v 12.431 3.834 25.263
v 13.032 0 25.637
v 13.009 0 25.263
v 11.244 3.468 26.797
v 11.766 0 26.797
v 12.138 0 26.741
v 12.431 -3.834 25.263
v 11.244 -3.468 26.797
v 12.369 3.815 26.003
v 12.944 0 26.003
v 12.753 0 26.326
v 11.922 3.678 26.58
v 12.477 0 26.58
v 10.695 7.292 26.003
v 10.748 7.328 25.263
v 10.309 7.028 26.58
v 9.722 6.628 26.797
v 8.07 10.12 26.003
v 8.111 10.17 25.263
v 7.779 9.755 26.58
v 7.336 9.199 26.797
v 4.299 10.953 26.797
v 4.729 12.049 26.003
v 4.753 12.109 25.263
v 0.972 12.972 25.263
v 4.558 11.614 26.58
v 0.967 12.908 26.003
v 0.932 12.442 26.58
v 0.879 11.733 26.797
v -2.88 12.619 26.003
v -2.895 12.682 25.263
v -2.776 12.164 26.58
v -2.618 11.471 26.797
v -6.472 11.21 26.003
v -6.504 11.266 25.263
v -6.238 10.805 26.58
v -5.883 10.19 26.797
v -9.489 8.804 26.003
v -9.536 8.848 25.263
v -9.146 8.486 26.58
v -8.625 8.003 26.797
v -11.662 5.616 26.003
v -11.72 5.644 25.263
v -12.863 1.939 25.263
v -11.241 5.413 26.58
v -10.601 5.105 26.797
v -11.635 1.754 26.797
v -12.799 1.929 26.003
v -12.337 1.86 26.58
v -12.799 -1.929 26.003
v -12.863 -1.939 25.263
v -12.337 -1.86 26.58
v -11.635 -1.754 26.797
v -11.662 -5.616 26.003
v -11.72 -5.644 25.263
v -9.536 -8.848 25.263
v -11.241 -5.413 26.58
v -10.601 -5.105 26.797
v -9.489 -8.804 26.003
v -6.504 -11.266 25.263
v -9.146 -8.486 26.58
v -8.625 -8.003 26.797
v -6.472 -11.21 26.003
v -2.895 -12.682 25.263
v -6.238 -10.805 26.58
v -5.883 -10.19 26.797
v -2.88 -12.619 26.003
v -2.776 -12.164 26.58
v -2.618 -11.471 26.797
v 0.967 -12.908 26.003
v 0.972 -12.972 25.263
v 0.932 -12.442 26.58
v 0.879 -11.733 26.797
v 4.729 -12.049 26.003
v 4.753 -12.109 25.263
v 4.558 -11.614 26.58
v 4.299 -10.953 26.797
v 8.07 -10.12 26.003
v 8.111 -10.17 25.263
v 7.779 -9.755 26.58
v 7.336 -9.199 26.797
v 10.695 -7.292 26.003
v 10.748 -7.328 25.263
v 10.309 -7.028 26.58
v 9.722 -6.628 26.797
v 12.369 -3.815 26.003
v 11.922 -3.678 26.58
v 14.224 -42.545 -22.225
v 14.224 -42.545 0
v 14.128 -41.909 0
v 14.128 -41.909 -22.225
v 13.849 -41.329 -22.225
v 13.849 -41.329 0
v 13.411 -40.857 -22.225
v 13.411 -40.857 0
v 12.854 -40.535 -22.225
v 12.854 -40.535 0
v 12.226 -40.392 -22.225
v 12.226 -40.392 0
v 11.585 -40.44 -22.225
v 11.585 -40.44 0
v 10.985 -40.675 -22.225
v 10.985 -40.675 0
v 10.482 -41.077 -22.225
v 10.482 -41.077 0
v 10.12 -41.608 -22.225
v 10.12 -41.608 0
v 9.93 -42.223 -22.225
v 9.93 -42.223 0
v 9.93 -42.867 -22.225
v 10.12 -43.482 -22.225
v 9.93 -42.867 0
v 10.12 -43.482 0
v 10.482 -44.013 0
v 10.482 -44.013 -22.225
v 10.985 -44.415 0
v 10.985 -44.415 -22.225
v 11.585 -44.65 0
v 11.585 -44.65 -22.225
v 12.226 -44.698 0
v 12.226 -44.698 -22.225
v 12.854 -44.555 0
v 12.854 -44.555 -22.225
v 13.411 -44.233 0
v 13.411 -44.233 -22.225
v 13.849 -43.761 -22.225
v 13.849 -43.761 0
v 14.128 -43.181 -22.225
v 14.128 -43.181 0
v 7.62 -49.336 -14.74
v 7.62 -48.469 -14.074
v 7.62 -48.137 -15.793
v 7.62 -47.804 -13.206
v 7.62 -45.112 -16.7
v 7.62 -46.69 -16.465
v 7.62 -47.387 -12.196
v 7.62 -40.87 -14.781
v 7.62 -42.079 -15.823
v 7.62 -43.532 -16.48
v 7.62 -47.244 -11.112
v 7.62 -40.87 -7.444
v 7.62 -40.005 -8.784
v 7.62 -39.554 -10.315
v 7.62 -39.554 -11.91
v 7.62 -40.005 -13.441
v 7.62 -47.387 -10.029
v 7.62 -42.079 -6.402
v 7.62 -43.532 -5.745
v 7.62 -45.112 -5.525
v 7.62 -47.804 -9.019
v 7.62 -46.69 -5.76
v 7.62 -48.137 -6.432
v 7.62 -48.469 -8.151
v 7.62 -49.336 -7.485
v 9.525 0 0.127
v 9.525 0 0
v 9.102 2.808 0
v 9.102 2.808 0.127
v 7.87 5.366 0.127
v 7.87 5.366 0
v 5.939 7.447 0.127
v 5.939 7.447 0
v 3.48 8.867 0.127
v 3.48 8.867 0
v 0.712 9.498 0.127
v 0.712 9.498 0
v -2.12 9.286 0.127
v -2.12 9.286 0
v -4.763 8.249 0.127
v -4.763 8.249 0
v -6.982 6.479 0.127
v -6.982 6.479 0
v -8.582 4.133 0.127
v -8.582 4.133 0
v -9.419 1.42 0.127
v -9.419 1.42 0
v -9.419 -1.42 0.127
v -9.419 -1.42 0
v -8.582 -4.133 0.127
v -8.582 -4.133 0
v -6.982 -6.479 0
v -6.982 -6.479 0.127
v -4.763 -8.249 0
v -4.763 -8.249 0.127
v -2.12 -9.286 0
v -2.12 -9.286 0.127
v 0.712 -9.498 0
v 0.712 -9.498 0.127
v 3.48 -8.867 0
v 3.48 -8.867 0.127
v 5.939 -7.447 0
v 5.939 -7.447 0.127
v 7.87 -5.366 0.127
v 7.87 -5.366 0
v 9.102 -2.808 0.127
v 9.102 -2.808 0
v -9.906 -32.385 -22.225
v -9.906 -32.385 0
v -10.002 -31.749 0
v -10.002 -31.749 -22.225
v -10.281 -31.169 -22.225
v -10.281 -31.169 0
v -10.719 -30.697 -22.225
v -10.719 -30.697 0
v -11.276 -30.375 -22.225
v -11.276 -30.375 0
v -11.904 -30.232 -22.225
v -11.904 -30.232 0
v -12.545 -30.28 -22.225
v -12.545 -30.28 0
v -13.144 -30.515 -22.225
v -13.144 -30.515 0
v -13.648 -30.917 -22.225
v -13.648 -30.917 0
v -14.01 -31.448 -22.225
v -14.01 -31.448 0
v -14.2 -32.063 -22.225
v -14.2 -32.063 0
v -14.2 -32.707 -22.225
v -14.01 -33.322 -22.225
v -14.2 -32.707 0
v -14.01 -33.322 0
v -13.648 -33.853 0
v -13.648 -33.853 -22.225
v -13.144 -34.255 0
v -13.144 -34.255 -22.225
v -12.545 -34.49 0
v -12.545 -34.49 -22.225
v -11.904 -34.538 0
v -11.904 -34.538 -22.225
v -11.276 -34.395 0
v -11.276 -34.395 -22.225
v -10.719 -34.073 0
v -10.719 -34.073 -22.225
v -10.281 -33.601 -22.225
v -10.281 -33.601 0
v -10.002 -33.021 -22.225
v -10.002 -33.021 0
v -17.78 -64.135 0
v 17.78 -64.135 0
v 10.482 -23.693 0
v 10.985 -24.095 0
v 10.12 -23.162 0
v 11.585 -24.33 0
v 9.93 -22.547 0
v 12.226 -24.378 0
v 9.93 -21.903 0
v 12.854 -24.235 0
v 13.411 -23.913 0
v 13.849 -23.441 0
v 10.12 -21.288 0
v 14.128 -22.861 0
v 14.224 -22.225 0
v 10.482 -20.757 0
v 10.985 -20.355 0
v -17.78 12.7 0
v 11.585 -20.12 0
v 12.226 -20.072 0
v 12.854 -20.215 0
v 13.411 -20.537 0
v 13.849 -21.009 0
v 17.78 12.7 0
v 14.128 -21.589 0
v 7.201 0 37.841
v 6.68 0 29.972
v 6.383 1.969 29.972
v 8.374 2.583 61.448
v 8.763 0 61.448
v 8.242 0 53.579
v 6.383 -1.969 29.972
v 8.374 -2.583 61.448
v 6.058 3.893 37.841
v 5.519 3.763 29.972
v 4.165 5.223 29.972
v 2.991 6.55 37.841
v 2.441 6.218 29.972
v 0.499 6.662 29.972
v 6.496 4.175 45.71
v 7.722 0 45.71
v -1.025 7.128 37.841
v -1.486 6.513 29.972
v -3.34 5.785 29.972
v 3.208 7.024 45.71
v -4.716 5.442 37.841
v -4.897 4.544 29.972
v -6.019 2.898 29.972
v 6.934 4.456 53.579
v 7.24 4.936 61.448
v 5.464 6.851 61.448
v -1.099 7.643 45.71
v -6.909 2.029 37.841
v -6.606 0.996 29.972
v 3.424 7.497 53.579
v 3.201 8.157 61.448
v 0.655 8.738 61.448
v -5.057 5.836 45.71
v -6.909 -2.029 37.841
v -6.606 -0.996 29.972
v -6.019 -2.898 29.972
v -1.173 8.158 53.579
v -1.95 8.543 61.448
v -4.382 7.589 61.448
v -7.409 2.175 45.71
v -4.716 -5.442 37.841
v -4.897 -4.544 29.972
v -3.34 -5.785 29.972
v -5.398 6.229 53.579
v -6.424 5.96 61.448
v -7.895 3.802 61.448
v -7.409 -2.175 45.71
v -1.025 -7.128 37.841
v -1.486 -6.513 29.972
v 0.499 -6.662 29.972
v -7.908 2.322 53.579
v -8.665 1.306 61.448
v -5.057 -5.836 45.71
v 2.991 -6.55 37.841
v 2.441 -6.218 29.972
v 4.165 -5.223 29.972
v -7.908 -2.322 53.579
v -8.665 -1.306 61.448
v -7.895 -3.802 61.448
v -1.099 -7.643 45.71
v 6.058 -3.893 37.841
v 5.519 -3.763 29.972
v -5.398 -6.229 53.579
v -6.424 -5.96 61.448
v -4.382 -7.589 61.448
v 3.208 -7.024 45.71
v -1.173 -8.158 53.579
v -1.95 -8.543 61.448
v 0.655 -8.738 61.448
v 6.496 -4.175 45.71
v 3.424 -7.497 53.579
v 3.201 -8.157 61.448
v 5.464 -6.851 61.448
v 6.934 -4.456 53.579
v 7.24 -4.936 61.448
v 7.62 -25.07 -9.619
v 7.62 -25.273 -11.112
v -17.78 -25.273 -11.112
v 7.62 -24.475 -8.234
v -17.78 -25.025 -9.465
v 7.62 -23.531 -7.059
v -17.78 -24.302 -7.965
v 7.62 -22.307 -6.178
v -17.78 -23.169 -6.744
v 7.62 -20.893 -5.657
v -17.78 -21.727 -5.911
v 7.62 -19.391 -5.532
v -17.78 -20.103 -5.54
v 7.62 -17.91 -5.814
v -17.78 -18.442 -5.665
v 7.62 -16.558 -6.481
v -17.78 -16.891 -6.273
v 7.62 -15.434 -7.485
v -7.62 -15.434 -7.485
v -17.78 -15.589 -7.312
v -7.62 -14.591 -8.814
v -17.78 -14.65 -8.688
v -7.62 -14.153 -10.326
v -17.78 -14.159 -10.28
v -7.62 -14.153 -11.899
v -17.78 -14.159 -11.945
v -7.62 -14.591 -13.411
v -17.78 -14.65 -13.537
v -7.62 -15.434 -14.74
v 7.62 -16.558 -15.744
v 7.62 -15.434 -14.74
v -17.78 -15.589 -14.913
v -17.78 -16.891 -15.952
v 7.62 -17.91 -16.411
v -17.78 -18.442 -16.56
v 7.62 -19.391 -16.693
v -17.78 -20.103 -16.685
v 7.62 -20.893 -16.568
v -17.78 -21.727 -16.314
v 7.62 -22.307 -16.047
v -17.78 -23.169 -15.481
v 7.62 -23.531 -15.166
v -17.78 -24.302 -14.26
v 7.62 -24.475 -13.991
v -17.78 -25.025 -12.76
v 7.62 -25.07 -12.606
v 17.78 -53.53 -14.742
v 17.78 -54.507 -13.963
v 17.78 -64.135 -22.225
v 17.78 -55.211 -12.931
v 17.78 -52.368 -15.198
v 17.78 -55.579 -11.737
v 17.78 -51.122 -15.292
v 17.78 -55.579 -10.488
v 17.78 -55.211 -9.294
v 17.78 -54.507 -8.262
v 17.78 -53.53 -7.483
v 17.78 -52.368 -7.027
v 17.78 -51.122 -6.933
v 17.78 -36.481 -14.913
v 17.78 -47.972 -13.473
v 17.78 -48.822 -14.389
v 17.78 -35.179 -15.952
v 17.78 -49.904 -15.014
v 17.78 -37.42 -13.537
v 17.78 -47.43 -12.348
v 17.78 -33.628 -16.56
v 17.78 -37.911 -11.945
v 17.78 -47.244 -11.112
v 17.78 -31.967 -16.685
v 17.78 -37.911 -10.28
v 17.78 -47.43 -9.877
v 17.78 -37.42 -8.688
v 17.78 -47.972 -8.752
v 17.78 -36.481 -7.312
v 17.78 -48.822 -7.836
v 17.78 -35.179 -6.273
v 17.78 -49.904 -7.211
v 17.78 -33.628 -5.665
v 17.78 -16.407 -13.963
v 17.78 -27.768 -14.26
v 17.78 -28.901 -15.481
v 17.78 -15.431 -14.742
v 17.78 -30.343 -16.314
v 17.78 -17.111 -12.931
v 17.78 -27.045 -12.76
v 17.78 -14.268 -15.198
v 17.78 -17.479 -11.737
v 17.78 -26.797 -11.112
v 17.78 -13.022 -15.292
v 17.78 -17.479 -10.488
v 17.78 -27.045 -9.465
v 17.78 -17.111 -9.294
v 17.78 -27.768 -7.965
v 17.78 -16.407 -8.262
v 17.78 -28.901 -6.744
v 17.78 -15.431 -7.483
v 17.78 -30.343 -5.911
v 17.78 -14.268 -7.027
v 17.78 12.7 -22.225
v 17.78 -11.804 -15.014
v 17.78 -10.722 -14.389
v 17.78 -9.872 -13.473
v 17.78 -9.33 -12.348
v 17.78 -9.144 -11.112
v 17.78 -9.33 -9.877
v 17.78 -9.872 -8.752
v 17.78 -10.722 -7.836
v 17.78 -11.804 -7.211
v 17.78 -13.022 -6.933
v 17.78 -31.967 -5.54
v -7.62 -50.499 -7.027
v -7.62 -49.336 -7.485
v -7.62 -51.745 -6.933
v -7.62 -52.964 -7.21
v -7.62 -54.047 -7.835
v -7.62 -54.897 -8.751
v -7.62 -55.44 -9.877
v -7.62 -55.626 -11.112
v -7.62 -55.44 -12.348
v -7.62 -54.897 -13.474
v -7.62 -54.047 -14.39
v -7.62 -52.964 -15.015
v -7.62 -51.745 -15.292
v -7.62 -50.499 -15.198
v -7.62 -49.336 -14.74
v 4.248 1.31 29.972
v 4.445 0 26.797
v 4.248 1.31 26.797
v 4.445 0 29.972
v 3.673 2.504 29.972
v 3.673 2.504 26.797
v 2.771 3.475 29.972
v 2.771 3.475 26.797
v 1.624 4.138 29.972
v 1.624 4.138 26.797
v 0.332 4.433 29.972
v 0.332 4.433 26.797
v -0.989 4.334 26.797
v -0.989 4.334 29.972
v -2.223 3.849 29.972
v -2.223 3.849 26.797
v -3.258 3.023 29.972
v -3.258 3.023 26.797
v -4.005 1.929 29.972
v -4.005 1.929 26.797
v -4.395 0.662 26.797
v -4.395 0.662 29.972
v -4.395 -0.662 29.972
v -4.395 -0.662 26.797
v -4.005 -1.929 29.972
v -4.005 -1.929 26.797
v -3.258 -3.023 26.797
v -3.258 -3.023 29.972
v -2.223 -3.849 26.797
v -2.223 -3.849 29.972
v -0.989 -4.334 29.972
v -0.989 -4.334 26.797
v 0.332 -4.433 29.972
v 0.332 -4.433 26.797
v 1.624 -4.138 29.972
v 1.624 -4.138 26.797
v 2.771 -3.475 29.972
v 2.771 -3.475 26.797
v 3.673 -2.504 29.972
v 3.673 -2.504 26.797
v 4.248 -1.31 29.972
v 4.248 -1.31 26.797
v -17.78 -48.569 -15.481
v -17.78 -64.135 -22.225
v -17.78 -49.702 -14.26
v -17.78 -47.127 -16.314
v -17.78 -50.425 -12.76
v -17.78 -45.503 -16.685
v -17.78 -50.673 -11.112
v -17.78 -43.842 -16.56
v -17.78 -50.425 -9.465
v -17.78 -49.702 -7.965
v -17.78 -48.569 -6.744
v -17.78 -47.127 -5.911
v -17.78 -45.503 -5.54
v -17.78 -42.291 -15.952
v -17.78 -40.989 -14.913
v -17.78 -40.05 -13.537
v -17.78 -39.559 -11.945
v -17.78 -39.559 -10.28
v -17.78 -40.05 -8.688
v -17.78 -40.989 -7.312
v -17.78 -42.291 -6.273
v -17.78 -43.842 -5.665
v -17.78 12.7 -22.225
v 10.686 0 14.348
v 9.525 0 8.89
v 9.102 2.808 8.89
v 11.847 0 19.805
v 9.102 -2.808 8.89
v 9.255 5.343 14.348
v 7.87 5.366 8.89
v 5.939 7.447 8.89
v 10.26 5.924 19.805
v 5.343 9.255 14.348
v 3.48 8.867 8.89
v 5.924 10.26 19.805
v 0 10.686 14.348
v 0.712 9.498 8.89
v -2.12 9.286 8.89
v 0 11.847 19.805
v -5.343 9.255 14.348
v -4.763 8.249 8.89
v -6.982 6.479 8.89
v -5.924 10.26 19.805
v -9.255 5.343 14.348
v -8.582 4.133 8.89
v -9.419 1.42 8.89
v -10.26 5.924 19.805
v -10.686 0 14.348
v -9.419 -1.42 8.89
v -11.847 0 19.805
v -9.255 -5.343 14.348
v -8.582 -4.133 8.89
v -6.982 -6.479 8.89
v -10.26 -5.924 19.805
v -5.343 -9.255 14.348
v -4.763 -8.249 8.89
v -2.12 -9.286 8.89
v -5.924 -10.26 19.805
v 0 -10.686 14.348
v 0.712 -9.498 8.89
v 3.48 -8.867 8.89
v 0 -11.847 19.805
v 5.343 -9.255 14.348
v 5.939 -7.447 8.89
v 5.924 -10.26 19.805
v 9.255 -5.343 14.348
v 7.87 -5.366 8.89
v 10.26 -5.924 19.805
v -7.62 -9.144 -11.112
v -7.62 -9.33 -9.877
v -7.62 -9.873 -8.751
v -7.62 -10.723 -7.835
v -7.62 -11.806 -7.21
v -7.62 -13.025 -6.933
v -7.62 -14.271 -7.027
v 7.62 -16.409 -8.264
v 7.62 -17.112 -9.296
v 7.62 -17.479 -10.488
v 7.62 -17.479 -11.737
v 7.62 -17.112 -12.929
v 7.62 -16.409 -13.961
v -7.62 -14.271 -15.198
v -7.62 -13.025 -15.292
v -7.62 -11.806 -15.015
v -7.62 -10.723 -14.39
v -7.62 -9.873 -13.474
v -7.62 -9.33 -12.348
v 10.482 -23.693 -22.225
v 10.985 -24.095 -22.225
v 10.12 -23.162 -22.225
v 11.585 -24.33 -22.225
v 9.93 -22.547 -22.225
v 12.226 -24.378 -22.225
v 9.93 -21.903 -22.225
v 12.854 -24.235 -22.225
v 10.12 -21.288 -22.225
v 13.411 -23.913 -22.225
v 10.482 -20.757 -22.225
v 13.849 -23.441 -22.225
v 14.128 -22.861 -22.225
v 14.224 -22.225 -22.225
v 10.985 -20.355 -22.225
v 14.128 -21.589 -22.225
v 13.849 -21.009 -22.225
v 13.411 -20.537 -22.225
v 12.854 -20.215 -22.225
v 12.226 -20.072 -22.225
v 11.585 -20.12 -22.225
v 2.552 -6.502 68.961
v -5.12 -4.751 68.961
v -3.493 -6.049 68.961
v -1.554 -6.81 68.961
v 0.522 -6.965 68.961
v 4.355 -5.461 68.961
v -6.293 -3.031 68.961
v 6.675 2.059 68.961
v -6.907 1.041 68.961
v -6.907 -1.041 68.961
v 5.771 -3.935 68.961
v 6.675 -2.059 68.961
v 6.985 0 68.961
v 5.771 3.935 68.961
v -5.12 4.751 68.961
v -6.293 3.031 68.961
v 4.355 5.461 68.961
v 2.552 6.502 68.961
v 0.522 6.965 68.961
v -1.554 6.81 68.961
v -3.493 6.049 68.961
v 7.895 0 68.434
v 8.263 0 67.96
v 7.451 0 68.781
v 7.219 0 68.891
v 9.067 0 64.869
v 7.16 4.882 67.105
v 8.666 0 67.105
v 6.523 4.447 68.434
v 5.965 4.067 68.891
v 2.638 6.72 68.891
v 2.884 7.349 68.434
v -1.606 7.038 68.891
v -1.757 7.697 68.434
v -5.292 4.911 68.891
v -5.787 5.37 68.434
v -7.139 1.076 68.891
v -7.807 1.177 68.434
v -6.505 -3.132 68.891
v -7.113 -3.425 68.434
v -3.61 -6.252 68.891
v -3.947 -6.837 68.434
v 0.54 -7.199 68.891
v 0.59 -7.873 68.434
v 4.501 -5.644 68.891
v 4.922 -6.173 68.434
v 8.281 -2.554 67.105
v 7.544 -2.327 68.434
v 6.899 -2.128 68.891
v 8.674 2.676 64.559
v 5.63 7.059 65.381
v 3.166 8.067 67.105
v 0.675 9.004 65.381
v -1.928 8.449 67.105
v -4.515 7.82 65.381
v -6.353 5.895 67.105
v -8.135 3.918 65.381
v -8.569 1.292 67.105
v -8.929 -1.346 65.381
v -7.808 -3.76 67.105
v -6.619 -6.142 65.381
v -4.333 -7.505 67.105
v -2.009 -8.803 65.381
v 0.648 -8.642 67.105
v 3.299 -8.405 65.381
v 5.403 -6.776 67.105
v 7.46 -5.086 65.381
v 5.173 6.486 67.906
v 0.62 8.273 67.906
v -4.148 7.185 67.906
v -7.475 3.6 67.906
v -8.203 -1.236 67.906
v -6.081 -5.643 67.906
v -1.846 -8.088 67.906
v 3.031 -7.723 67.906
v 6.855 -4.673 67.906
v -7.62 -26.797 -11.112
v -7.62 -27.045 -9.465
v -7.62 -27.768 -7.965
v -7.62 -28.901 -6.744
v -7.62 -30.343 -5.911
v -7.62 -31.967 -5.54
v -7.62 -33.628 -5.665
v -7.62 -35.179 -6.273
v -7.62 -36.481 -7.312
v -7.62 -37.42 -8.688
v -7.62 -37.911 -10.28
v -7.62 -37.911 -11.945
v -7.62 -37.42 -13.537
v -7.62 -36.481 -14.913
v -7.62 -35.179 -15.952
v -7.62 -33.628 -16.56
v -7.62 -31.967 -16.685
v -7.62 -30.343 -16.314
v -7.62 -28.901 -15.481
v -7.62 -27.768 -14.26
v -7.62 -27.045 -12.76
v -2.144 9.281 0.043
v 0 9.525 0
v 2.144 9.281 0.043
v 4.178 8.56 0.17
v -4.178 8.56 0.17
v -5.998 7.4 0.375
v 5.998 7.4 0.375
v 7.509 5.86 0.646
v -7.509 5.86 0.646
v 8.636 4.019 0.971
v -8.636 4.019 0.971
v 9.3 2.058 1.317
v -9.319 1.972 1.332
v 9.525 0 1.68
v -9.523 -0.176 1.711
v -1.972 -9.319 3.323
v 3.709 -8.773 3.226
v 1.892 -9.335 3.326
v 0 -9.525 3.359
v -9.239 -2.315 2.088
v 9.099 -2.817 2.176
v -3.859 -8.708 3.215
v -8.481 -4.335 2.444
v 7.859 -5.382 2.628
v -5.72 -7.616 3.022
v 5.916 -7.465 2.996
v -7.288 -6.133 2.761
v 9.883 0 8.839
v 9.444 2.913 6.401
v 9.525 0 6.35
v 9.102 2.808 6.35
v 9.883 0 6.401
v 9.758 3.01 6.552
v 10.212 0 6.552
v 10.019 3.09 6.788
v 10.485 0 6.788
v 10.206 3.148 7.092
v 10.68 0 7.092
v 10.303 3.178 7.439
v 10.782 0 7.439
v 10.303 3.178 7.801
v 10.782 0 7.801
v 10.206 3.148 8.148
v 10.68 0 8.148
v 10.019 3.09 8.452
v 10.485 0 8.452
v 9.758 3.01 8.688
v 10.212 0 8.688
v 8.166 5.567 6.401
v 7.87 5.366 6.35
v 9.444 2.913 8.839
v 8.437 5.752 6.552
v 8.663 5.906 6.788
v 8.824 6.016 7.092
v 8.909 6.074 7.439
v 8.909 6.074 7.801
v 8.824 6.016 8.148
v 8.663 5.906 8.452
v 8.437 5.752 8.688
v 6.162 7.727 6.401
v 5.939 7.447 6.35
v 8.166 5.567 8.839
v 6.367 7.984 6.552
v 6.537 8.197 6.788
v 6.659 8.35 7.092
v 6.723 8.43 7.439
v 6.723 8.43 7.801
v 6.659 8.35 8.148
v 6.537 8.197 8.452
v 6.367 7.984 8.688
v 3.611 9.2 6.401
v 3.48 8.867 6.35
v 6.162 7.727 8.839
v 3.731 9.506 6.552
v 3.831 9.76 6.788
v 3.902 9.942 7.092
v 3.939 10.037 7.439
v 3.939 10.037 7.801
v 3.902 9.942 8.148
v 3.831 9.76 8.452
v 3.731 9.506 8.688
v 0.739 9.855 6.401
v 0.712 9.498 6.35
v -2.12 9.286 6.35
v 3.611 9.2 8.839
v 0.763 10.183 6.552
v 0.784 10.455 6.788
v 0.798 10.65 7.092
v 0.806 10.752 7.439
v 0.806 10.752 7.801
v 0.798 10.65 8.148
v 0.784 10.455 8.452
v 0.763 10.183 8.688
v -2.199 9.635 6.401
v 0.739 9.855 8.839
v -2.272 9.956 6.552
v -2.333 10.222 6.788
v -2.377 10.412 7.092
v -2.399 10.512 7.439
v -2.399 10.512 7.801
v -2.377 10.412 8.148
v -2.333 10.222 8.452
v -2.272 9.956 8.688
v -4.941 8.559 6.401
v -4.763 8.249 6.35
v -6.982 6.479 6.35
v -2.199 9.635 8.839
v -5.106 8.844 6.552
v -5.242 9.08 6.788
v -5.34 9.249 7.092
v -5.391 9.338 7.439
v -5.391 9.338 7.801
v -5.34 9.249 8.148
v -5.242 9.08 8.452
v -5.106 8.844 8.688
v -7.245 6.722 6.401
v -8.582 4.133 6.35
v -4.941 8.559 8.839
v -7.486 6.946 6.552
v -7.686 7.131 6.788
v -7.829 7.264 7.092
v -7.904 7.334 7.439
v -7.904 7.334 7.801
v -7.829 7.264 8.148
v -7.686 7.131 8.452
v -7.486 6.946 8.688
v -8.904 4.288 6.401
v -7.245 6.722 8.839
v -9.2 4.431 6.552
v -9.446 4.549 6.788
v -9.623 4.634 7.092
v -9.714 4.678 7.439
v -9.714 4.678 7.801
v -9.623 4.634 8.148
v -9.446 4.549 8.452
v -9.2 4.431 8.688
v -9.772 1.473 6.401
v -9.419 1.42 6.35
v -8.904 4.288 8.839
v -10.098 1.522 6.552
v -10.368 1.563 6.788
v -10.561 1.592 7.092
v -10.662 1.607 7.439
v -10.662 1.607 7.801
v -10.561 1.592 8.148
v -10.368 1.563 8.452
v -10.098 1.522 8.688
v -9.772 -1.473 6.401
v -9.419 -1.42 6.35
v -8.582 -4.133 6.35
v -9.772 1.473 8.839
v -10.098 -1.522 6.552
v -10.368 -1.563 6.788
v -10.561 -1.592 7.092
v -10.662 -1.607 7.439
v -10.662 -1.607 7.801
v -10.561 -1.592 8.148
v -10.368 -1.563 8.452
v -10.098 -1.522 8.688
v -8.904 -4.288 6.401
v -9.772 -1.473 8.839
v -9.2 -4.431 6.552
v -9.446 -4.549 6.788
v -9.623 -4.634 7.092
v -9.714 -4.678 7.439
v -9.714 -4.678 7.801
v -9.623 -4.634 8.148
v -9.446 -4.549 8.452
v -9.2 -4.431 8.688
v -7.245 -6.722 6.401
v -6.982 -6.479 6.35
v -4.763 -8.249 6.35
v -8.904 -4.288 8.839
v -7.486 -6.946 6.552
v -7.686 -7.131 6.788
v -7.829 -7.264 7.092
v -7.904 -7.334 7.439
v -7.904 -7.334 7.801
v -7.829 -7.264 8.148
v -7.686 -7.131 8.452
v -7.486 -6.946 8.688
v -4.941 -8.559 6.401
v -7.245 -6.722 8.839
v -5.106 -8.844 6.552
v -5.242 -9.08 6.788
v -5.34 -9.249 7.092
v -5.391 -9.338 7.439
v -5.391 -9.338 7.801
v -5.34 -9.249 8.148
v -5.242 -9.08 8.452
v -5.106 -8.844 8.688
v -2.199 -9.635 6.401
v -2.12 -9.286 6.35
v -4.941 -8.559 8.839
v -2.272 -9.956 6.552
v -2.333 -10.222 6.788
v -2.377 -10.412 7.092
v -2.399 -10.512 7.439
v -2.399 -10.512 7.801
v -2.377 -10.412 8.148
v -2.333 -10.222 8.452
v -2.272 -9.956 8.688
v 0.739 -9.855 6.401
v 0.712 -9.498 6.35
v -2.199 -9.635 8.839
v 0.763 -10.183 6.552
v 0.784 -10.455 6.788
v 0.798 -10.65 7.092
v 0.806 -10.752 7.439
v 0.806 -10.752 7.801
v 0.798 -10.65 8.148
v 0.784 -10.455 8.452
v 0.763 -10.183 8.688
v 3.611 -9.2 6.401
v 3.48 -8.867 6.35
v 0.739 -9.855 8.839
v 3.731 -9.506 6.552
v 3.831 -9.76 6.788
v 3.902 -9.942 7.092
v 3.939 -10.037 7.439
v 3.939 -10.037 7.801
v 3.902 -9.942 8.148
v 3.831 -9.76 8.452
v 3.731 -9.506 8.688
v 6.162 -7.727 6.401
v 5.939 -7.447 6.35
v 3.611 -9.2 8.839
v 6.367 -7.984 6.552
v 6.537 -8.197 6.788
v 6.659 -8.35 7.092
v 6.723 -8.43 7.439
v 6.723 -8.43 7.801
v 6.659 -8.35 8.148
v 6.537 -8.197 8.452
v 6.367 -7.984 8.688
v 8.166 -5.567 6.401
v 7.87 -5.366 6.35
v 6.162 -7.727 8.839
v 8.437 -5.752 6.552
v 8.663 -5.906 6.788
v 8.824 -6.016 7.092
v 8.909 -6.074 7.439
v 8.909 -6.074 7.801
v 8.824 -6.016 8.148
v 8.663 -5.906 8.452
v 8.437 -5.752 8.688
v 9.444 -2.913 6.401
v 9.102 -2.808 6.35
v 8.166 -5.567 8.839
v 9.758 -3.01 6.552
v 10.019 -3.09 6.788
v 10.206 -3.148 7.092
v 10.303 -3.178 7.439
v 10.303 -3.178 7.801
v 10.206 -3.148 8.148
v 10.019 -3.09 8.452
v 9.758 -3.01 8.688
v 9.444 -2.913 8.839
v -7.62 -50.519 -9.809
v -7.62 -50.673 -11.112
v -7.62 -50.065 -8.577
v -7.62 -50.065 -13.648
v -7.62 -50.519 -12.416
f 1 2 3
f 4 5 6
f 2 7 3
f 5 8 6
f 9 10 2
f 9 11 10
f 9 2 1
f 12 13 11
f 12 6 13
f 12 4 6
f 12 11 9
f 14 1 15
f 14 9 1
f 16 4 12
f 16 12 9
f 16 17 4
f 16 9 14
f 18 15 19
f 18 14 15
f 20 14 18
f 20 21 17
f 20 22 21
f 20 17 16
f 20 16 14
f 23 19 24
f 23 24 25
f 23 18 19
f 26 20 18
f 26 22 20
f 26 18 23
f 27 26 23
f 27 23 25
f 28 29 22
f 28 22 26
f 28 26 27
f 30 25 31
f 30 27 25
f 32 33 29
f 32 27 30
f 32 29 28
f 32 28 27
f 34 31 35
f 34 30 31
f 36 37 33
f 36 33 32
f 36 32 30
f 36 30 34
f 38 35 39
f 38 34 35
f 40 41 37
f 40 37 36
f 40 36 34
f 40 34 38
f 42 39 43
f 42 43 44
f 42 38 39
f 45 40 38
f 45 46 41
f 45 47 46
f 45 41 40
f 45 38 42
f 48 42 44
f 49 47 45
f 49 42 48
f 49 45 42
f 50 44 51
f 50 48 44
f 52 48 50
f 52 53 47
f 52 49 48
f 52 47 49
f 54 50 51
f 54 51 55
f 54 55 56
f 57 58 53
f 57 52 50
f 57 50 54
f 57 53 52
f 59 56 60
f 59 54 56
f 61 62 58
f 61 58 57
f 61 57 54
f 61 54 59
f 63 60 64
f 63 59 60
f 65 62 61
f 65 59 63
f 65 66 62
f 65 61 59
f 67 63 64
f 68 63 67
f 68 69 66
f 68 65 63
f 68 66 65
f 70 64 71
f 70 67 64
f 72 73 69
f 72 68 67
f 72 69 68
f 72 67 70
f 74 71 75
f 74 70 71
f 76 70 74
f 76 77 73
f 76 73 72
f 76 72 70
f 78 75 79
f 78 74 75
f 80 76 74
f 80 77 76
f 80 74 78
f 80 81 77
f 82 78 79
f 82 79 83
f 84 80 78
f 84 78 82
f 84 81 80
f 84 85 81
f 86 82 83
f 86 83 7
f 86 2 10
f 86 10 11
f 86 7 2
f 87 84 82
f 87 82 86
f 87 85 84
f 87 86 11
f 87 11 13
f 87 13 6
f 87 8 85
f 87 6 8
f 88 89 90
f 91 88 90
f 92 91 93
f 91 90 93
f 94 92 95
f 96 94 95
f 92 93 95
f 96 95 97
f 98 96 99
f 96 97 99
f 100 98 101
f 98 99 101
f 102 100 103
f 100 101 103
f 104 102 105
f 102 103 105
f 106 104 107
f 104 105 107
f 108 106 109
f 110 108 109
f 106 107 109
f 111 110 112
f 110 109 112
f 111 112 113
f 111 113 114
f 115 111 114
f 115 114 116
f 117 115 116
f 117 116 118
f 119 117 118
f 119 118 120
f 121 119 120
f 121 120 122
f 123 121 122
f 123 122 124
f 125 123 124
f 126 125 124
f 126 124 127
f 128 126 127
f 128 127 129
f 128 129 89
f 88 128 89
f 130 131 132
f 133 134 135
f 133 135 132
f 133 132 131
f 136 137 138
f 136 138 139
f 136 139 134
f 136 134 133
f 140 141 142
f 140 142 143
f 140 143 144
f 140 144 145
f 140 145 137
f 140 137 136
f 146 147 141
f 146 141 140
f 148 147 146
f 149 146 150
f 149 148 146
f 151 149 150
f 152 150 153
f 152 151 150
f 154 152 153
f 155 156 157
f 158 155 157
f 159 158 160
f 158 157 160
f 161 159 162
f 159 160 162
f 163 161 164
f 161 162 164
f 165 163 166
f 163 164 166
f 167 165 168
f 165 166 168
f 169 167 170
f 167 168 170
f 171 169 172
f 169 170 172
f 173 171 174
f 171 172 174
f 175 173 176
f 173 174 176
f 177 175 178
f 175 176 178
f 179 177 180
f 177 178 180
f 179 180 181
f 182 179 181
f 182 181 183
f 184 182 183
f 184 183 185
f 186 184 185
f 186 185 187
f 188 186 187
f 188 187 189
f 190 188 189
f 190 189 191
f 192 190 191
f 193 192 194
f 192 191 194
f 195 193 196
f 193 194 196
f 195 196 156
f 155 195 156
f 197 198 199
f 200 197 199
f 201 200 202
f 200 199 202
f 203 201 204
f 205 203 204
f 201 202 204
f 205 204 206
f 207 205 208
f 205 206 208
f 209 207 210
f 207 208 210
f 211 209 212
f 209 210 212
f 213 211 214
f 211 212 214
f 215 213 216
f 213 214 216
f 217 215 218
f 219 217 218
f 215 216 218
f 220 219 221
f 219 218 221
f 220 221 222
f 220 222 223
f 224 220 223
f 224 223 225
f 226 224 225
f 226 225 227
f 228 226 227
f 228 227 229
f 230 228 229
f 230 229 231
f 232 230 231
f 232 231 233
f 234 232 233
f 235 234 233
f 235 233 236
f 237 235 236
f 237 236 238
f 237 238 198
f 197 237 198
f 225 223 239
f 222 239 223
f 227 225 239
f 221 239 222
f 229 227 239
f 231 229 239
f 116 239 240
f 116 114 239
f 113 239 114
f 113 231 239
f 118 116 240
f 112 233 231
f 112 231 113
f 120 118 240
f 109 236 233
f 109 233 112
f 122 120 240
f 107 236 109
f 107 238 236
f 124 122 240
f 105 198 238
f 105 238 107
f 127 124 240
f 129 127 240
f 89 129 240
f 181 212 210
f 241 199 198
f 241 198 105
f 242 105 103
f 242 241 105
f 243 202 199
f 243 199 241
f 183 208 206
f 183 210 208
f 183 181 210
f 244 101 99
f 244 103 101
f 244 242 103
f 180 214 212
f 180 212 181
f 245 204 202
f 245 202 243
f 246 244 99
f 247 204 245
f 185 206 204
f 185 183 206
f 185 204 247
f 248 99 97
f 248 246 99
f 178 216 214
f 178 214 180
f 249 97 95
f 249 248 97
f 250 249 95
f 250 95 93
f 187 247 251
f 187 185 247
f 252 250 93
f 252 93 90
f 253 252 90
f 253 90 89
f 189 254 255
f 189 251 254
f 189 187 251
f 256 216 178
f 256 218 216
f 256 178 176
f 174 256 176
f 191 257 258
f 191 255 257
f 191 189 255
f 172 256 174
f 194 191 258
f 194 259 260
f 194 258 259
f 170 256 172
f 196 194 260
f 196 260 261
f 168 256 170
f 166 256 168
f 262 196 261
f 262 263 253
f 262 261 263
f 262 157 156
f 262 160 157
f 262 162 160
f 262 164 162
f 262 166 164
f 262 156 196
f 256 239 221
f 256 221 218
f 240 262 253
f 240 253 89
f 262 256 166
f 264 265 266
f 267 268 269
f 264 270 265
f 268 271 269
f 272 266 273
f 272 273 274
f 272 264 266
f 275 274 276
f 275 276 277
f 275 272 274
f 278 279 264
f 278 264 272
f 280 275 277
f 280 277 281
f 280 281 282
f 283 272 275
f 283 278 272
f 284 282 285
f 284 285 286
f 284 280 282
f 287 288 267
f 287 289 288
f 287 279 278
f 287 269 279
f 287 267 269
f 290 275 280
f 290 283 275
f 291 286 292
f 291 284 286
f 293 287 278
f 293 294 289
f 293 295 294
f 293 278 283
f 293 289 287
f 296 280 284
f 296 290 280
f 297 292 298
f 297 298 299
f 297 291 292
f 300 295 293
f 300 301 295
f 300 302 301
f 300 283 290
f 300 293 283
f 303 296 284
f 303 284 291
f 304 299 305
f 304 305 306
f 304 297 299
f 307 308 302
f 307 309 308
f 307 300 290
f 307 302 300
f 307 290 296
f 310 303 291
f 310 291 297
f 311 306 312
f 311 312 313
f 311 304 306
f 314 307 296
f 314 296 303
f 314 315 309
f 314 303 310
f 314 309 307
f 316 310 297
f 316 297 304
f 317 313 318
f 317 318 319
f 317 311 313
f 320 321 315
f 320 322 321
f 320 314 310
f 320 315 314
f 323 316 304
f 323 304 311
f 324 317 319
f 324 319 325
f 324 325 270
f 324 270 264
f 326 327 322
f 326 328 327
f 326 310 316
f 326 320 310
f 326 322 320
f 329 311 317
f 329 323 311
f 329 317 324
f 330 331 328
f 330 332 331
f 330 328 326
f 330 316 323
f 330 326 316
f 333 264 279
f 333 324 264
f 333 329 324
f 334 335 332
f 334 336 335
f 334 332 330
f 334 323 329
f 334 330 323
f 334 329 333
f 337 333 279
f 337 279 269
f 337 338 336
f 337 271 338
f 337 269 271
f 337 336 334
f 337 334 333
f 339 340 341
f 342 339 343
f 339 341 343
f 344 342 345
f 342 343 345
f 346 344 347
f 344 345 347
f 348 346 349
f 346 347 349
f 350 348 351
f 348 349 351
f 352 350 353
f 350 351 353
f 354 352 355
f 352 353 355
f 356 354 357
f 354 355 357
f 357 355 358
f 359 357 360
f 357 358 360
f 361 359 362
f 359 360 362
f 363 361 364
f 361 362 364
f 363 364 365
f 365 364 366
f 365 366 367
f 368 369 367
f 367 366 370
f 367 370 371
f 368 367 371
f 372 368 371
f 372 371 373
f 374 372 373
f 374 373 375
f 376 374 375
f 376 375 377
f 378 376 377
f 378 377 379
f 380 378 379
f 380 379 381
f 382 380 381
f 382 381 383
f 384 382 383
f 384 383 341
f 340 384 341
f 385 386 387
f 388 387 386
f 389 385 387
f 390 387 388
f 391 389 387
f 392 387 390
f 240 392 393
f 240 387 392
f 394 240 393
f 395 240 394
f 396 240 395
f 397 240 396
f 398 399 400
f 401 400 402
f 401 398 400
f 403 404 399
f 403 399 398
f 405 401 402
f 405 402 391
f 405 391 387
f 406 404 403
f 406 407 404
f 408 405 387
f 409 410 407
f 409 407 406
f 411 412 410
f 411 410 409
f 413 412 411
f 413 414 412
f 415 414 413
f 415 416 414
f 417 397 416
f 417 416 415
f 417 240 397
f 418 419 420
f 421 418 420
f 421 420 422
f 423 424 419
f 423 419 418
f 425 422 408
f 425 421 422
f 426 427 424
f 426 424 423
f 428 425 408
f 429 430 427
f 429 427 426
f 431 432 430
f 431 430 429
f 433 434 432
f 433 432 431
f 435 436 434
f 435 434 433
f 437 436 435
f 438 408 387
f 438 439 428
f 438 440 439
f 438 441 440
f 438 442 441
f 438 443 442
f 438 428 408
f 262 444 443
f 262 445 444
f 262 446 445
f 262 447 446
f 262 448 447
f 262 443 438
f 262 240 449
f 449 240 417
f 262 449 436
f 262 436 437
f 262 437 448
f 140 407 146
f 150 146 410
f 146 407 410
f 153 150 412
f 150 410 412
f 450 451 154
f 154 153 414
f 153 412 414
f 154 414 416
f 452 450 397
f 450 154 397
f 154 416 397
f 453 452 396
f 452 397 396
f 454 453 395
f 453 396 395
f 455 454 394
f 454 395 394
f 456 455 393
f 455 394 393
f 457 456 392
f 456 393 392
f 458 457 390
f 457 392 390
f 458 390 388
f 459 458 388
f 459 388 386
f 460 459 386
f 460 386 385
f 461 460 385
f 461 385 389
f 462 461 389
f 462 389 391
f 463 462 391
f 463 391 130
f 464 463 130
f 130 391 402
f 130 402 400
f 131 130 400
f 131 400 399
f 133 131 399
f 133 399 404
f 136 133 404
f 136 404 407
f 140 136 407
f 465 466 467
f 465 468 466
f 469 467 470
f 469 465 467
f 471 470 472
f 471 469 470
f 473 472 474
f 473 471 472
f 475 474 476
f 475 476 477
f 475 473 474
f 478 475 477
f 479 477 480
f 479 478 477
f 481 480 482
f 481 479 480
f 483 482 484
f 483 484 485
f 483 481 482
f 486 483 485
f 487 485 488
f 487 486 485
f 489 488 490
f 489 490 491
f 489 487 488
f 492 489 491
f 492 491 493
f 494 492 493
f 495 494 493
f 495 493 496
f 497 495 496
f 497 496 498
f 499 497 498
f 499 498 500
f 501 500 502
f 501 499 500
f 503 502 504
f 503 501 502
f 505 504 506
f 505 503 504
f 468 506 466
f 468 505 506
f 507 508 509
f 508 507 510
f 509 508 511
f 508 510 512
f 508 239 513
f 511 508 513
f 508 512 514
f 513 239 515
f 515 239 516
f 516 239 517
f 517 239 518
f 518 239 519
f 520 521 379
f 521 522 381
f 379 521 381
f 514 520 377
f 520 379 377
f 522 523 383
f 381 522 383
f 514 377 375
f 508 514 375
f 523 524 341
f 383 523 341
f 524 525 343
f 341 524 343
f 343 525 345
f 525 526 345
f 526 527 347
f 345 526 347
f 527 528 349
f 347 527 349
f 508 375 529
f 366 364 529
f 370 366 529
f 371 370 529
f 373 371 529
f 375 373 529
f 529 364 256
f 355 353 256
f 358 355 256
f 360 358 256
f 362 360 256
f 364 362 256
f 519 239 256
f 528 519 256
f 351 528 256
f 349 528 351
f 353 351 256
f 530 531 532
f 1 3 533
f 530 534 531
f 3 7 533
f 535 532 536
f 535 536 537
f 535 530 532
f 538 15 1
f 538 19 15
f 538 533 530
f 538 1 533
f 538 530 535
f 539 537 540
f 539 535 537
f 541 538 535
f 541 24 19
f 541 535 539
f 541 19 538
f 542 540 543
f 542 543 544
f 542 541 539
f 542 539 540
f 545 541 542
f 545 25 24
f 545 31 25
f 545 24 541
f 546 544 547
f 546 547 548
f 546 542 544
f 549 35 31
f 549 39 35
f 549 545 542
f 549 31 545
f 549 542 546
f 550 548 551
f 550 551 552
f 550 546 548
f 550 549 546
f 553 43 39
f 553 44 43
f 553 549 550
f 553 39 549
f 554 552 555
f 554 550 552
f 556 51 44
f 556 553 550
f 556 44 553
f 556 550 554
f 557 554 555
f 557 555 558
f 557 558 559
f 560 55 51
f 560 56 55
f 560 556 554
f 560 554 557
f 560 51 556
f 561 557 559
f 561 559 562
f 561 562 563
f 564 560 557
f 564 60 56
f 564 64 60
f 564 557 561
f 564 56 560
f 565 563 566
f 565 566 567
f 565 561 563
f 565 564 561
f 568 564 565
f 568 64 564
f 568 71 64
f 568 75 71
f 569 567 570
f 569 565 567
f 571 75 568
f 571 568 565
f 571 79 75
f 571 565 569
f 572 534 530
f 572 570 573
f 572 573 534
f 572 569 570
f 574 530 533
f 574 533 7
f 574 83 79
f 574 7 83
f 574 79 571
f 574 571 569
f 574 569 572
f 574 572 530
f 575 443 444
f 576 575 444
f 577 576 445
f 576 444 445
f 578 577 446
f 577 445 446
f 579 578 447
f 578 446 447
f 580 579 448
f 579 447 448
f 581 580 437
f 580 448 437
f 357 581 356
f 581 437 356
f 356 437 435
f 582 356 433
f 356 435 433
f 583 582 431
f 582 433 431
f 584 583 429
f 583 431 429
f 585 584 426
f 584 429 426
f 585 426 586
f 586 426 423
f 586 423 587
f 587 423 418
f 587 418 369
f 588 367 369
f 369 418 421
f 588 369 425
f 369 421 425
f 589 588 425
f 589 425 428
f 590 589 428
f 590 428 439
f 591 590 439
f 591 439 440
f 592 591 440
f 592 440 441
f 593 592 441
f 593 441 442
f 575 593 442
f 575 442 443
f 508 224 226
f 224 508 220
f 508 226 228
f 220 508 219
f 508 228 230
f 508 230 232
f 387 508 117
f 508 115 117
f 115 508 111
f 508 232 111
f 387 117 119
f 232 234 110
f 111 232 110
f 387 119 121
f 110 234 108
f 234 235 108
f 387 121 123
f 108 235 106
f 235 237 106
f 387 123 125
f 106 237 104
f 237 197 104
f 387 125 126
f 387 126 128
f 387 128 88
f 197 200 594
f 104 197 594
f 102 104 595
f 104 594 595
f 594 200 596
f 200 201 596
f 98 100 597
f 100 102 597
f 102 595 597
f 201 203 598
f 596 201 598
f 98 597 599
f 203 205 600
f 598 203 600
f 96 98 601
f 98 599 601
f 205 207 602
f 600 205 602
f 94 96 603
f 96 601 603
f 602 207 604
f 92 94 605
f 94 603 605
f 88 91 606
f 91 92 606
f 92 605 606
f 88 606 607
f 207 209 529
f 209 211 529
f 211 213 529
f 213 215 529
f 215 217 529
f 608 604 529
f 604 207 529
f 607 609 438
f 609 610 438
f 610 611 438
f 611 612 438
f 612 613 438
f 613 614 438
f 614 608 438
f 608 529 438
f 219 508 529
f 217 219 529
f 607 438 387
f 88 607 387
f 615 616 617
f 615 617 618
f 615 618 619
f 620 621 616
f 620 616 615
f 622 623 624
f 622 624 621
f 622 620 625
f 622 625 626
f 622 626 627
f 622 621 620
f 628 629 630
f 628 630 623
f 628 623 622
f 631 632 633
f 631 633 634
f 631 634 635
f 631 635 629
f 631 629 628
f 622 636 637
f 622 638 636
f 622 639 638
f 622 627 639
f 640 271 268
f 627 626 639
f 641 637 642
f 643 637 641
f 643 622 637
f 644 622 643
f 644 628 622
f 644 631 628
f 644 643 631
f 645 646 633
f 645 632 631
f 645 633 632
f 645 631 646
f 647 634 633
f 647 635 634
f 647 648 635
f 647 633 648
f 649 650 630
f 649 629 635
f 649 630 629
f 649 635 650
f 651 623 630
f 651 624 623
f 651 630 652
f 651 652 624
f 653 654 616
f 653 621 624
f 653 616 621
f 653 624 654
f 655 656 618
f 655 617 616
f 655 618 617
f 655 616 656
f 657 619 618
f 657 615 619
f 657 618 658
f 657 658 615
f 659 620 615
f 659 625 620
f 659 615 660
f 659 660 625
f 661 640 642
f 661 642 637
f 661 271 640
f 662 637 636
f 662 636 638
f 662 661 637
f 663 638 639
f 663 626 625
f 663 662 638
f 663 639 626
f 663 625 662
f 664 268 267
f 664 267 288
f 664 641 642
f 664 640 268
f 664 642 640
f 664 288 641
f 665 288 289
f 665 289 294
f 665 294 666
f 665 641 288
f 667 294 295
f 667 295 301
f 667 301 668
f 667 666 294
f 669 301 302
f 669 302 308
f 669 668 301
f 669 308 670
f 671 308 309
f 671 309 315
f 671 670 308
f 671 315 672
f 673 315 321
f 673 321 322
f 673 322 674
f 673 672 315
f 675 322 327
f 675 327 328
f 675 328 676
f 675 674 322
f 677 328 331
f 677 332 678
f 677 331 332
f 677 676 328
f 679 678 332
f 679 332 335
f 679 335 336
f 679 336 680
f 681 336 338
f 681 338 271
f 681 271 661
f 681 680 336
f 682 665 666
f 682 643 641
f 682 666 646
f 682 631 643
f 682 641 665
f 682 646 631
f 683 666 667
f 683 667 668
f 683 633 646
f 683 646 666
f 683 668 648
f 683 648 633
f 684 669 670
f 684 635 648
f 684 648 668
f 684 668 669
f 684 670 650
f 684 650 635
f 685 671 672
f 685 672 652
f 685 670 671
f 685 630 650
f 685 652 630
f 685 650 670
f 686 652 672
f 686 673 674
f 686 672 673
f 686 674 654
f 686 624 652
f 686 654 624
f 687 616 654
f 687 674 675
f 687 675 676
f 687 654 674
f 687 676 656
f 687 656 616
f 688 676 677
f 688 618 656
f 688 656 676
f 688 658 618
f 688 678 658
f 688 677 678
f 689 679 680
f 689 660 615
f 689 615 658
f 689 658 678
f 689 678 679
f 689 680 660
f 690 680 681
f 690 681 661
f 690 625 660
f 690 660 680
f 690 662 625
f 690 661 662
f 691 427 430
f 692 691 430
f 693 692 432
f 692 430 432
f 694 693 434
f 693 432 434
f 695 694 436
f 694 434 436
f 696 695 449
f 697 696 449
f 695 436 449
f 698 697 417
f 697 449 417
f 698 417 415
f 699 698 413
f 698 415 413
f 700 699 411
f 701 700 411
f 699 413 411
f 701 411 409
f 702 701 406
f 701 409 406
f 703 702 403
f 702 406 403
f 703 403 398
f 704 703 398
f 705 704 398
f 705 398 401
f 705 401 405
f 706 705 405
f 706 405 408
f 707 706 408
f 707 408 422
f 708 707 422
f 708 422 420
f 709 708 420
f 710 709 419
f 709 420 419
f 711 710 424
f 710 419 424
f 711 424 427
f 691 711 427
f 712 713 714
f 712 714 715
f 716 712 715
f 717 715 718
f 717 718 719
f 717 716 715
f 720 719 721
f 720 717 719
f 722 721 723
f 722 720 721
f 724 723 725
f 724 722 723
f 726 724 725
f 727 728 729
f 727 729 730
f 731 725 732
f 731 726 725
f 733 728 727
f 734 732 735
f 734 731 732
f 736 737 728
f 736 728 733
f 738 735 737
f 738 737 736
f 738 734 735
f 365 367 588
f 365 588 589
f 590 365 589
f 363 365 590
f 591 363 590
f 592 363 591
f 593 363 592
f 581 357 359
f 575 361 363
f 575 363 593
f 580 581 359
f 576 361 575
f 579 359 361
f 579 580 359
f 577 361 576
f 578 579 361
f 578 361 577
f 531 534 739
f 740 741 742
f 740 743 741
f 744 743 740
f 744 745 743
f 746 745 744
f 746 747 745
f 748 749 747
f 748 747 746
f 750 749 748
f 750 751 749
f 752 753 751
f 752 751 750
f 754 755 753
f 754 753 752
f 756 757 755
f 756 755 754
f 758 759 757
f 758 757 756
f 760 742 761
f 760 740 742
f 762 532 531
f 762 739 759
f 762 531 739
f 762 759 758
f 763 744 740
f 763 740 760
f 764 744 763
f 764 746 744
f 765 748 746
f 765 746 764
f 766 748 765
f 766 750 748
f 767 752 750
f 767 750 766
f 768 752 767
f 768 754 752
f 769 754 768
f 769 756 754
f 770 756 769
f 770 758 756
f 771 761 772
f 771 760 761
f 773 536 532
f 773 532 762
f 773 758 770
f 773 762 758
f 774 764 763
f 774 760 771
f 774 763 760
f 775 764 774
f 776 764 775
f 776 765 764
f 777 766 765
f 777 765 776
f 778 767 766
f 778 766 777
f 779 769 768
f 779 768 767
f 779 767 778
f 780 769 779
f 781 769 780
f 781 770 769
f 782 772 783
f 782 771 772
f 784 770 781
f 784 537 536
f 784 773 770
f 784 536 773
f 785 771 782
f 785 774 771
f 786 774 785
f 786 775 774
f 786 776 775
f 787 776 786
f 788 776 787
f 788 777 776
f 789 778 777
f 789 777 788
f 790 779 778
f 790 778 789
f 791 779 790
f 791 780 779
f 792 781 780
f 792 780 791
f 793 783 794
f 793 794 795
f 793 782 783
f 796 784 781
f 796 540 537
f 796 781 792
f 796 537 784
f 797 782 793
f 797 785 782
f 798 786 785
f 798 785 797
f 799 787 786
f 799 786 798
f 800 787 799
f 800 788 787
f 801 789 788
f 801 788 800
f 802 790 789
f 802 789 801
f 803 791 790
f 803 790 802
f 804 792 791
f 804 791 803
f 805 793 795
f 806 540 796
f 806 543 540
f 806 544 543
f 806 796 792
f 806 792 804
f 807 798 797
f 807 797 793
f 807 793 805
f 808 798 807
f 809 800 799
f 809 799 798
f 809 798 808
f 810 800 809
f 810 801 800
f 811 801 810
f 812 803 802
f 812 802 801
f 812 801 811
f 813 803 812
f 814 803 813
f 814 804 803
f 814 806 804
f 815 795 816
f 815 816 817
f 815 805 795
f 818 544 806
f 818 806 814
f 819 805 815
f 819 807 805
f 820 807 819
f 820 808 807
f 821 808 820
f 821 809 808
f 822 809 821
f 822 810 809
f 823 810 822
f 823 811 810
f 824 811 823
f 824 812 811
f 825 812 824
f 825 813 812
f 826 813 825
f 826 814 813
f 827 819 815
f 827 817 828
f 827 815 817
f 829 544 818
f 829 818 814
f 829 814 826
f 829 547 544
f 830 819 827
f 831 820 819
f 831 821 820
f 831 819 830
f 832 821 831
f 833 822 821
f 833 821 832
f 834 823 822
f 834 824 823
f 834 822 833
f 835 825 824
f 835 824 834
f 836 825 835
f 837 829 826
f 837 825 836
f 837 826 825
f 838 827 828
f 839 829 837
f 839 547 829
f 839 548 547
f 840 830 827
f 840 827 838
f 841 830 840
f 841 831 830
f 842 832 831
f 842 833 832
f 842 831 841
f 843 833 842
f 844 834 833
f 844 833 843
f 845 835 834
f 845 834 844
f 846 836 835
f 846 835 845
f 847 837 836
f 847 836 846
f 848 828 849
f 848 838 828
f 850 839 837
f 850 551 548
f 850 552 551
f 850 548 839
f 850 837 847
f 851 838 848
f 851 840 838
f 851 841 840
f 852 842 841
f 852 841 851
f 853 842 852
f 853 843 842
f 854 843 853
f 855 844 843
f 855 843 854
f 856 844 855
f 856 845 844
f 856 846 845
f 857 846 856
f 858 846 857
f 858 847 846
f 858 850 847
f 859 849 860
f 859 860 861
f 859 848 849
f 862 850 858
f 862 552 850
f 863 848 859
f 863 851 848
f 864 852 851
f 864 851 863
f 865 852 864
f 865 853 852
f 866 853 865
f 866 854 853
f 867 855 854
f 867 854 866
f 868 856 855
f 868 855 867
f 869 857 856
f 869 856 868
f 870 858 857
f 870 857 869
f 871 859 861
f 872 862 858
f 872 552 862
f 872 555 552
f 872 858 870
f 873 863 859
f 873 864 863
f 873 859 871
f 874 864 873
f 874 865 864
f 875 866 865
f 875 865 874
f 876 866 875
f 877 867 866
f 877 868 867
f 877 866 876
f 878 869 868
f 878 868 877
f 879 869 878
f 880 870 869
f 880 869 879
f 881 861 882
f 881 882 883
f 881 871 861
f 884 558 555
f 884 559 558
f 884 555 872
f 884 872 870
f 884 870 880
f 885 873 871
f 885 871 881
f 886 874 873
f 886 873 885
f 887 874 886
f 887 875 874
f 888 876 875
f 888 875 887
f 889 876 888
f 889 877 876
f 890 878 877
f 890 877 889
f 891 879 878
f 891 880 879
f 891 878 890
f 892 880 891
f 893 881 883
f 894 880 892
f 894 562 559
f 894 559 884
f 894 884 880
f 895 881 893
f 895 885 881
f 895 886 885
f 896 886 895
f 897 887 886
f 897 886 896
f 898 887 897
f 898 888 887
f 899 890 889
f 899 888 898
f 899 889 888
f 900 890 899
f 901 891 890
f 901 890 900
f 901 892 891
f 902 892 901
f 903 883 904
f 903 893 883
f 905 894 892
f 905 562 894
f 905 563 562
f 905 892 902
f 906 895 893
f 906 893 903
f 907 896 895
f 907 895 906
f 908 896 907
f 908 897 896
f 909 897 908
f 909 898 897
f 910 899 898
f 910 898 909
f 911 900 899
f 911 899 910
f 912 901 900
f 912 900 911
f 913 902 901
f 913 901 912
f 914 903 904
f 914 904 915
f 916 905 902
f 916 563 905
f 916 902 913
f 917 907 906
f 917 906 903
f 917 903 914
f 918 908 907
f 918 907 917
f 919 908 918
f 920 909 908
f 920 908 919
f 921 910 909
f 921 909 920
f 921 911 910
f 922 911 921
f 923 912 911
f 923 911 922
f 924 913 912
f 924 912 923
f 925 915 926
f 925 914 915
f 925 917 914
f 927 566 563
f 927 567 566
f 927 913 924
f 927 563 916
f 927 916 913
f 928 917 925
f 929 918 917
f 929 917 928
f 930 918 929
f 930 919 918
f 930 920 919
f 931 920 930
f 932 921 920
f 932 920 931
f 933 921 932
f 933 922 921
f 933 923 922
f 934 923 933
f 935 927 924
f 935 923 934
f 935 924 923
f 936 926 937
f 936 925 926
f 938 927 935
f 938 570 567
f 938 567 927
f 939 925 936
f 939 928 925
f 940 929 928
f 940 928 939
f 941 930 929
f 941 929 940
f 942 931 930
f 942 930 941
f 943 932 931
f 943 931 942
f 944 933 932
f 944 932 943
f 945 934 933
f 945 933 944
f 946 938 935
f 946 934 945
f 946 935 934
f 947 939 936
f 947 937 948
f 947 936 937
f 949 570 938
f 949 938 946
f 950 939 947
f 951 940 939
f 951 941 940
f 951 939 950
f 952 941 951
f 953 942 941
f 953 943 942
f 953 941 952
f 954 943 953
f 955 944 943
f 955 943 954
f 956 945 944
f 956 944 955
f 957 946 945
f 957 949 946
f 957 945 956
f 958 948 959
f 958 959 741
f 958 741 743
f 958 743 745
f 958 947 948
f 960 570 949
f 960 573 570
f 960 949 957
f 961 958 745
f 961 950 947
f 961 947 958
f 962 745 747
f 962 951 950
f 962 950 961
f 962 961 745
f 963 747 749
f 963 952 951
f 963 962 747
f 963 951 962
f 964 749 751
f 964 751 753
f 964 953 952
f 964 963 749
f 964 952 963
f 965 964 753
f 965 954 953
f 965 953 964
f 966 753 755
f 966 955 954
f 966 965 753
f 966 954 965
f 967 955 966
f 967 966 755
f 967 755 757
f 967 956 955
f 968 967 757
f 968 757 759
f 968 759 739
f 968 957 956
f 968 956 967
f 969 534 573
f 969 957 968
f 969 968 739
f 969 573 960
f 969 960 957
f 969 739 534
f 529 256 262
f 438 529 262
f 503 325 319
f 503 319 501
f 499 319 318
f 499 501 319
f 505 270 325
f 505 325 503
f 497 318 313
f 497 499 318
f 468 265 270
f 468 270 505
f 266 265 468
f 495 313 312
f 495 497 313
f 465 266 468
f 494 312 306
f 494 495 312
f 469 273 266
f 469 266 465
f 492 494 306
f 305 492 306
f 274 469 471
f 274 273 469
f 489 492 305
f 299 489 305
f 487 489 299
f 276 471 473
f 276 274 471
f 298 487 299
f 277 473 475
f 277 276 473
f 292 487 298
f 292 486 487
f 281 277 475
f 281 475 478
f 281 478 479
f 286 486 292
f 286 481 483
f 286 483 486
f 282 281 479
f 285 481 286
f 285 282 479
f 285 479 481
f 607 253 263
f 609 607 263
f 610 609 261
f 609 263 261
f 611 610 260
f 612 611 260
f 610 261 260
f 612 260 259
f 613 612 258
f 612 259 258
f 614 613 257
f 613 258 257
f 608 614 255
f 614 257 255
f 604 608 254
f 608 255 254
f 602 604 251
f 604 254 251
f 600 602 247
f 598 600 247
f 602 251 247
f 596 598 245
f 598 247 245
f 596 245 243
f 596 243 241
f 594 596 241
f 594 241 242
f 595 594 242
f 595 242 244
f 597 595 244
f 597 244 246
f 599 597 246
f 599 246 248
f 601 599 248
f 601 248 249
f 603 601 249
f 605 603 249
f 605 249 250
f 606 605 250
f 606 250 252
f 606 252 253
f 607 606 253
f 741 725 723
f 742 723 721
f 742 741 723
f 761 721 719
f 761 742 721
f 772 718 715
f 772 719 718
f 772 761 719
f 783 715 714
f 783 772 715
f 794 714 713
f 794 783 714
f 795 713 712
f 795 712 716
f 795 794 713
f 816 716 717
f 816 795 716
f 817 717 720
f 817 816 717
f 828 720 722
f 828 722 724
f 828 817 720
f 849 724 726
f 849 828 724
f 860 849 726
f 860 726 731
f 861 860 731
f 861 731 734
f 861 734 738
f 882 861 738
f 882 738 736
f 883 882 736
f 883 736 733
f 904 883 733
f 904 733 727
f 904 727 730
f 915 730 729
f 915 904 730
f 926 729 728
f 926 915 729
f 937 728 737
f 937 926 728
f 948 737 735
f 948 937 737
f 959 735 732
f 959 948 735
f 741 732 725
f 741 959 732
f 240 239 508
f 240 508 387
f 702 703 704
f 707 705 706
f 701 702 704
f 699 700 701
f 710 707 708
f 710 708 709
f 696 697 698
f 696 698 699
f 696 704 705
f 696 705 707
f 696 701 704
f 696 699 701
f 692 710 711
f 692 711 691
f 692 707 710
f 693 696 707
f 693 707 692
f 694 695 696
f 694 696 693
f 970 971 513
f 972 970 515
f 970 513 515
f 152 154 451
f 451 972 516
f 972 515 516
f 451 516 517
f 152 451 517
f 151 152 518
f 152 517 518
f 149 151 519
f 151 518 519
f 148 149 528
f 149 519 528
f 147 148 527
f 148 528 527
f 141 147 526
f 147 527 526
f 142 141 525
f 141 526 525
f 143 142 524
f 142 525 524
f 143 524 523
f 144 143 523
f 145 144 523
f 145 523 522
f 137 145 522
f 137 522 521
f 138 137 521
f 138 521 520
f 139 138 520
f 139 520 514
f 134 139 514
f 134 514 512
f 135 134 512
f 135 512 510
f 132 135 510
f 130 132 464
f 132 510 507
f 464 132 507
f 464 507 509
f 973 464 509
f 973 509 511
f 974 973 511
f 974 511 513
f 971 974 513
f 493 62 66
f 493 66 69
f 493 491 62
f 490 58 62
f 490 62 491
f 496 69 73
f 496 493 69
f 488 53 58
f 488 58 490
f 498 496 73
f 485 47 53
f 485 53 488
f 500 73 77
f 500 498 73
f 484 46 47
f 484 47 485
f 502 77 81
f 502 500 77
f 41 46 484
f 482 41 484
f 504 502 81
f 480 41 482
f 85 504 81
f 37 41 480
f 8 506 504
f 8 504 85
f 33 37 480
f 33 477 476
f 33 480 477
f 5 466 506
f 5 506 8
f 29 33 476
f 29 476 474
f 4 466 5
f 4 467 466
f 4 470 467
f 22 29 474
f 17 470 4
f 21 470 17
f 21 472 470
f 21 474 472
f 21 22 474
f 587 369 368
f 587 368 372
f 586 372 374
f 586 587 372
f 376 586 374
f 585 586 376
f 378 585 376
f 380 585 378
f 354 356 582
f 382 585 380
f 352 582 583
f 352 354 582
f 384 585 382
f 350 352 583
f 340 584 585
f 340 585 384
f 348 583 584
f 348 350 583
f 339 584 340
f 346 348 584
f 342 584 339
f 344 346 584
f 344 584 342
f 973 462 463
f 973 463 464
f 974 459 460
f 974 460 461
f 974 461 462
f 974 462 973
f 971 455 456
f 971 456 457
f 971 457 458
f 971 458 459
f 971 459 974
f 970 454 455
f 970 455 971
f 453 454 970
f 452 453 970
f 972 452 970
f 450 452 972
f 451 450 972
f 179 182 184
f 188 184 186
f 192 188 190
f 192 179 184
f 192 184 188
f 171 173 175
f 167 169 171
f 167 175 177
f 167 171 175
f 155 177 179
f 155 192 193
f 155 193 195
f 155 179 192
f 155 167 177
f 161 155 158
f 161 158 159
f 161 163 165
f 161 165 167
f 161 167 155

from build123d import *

# Parameters (mm, degrees)
F2_W          = 35.56
F2_H          = 76.835
F3_DEPTH      = 22.225
F4_R          = 4.191
F4_R_2        = 5.588
F6_DEPTH      = 25.4
F5_R          = 5.588
F7_DEPTH      = 25.4
F9_DEPTH      = 17.781
F9_DEPTH_BACK = 17.781
F10_R         = 9.525
F11_DEPTH     = 0.127
F12_R         = 2.159
F13_DEPTH     = 22.226


with BuildPart() as f1:
    # F0 (on Front) → F1 (revolve)
    with BuildSketch(Plane.XZ):
        with BuildLine():
            Line((0, 68.961), (0, 0))
            Line((0, 0), (9.525, 0))
            Line((9.525, 0), (9.525, 6.35))
            ThreePointArc((9.525, 6.35), (10.795, 7.62), (9.525, 8.89))
            Line((9.525, 8.89), (13.0085538918, 25.2627032915))
            ThreePointArc((13.0085538918, 25.2627032915), (12.7534147859, 26.3261380295), (11.766359362, 26.797))
            Line((11.766359362, 26.797), (4.445, 26.797))
            Line((4.445, 26.797), (4.445, 29.972))
            Line((4.445, 29.972), (6.6802, 29.972))
            Line((6.6802, 29.972), (8.763, 61.4476334416))
            add(Edge.make_bspline(
                [(8.763, 61.4476334416), (10.233264787, 68.2599443036), (6.985, 68.961)],
                knots=[4.7123889804, 4.7123889804, 4.7123889804, 6.2831853072, 6.2831853072, 6.2831853072], degree=2, weights=[1, 0.7071067812, 1]))
            Line((6.985, 68.961), (0, 68.961))
        make_face()
    revolve(axis=Axis((0, 0, 34.4805), (0, 0, 1)))

    # F8 (on Right) → F9 (cut, two sides)
    with BuildSketch(Plane.YZ) as f9_sk:
        Polygon((-9.525, 0), (9.525, 0), (-9.525, 3.3590289825), align=None)
    extrude(amount=-F9_DEPTH, mode=Mode.SUBTRACT)
    extrude(f9_sk.sketch, amount=F9_DEPTH_BACK, mode=Mode.SUBTRACT)


with BuildPart() as f3:
    # F2 (on Top) → F3 (new body)
    with BuildSketch(Plane.XY):
        with Locations((0, -25.7175)):
            Rectangle(F2_W, F2_H)
    extrude(amount=-F3_DEPTH)

    # F4 (on face) → F6 (cut)
    with BuildSketch(Plane.YZ.offset(17.78)):
        with Locations((-51.435, -11.1125)):
            Circle(F4_R)
        with Locations((-32.385, -11.1125)):
            Circle(F4_R_2)
        with Locations((-13.335, -11.1125)):
            Circle(F4_R)
    extrude(amount=-F6_DEPTH, mode=Mode.SUBTRACT)

    # F5 (on face) → F7 (cut)
    with BuildSketch(Plane(origin=(-17.78, 0, 0), x_dir=(0, -1, 0), z_dir=(-1, 0, 0))):
        with Locations((45.085, -11.1125)):
            Circle(F5_R)
        with Locations((19.685, -11.1125)):
            Circle(F5_R)
    extrude(amount=-F7_DEPTH, mode=Mode.SUBTRACT)

    # F10 (on face) → F11 (join)
    with BuildSketch(Plane.XY):
        Circle(F10_R)
    extrude(amount=F11_DEPTH)

    # F12 (on face) → F13 (cut, through all)
    with BuildSketch(Plane.XY):
        with Locations((-12.065, -32.385)):
            Circle(F12_R)
        with Locations((12.065, -22.225)):
            Circle(F12_R)
        with Locations((12.065, -42.545)):
            Circle(F12_R)
    extrude(amount=-F13_DEPTH, mode=Mode.SUBTRACT)


solid = Compound([f1.part, f3.part])
